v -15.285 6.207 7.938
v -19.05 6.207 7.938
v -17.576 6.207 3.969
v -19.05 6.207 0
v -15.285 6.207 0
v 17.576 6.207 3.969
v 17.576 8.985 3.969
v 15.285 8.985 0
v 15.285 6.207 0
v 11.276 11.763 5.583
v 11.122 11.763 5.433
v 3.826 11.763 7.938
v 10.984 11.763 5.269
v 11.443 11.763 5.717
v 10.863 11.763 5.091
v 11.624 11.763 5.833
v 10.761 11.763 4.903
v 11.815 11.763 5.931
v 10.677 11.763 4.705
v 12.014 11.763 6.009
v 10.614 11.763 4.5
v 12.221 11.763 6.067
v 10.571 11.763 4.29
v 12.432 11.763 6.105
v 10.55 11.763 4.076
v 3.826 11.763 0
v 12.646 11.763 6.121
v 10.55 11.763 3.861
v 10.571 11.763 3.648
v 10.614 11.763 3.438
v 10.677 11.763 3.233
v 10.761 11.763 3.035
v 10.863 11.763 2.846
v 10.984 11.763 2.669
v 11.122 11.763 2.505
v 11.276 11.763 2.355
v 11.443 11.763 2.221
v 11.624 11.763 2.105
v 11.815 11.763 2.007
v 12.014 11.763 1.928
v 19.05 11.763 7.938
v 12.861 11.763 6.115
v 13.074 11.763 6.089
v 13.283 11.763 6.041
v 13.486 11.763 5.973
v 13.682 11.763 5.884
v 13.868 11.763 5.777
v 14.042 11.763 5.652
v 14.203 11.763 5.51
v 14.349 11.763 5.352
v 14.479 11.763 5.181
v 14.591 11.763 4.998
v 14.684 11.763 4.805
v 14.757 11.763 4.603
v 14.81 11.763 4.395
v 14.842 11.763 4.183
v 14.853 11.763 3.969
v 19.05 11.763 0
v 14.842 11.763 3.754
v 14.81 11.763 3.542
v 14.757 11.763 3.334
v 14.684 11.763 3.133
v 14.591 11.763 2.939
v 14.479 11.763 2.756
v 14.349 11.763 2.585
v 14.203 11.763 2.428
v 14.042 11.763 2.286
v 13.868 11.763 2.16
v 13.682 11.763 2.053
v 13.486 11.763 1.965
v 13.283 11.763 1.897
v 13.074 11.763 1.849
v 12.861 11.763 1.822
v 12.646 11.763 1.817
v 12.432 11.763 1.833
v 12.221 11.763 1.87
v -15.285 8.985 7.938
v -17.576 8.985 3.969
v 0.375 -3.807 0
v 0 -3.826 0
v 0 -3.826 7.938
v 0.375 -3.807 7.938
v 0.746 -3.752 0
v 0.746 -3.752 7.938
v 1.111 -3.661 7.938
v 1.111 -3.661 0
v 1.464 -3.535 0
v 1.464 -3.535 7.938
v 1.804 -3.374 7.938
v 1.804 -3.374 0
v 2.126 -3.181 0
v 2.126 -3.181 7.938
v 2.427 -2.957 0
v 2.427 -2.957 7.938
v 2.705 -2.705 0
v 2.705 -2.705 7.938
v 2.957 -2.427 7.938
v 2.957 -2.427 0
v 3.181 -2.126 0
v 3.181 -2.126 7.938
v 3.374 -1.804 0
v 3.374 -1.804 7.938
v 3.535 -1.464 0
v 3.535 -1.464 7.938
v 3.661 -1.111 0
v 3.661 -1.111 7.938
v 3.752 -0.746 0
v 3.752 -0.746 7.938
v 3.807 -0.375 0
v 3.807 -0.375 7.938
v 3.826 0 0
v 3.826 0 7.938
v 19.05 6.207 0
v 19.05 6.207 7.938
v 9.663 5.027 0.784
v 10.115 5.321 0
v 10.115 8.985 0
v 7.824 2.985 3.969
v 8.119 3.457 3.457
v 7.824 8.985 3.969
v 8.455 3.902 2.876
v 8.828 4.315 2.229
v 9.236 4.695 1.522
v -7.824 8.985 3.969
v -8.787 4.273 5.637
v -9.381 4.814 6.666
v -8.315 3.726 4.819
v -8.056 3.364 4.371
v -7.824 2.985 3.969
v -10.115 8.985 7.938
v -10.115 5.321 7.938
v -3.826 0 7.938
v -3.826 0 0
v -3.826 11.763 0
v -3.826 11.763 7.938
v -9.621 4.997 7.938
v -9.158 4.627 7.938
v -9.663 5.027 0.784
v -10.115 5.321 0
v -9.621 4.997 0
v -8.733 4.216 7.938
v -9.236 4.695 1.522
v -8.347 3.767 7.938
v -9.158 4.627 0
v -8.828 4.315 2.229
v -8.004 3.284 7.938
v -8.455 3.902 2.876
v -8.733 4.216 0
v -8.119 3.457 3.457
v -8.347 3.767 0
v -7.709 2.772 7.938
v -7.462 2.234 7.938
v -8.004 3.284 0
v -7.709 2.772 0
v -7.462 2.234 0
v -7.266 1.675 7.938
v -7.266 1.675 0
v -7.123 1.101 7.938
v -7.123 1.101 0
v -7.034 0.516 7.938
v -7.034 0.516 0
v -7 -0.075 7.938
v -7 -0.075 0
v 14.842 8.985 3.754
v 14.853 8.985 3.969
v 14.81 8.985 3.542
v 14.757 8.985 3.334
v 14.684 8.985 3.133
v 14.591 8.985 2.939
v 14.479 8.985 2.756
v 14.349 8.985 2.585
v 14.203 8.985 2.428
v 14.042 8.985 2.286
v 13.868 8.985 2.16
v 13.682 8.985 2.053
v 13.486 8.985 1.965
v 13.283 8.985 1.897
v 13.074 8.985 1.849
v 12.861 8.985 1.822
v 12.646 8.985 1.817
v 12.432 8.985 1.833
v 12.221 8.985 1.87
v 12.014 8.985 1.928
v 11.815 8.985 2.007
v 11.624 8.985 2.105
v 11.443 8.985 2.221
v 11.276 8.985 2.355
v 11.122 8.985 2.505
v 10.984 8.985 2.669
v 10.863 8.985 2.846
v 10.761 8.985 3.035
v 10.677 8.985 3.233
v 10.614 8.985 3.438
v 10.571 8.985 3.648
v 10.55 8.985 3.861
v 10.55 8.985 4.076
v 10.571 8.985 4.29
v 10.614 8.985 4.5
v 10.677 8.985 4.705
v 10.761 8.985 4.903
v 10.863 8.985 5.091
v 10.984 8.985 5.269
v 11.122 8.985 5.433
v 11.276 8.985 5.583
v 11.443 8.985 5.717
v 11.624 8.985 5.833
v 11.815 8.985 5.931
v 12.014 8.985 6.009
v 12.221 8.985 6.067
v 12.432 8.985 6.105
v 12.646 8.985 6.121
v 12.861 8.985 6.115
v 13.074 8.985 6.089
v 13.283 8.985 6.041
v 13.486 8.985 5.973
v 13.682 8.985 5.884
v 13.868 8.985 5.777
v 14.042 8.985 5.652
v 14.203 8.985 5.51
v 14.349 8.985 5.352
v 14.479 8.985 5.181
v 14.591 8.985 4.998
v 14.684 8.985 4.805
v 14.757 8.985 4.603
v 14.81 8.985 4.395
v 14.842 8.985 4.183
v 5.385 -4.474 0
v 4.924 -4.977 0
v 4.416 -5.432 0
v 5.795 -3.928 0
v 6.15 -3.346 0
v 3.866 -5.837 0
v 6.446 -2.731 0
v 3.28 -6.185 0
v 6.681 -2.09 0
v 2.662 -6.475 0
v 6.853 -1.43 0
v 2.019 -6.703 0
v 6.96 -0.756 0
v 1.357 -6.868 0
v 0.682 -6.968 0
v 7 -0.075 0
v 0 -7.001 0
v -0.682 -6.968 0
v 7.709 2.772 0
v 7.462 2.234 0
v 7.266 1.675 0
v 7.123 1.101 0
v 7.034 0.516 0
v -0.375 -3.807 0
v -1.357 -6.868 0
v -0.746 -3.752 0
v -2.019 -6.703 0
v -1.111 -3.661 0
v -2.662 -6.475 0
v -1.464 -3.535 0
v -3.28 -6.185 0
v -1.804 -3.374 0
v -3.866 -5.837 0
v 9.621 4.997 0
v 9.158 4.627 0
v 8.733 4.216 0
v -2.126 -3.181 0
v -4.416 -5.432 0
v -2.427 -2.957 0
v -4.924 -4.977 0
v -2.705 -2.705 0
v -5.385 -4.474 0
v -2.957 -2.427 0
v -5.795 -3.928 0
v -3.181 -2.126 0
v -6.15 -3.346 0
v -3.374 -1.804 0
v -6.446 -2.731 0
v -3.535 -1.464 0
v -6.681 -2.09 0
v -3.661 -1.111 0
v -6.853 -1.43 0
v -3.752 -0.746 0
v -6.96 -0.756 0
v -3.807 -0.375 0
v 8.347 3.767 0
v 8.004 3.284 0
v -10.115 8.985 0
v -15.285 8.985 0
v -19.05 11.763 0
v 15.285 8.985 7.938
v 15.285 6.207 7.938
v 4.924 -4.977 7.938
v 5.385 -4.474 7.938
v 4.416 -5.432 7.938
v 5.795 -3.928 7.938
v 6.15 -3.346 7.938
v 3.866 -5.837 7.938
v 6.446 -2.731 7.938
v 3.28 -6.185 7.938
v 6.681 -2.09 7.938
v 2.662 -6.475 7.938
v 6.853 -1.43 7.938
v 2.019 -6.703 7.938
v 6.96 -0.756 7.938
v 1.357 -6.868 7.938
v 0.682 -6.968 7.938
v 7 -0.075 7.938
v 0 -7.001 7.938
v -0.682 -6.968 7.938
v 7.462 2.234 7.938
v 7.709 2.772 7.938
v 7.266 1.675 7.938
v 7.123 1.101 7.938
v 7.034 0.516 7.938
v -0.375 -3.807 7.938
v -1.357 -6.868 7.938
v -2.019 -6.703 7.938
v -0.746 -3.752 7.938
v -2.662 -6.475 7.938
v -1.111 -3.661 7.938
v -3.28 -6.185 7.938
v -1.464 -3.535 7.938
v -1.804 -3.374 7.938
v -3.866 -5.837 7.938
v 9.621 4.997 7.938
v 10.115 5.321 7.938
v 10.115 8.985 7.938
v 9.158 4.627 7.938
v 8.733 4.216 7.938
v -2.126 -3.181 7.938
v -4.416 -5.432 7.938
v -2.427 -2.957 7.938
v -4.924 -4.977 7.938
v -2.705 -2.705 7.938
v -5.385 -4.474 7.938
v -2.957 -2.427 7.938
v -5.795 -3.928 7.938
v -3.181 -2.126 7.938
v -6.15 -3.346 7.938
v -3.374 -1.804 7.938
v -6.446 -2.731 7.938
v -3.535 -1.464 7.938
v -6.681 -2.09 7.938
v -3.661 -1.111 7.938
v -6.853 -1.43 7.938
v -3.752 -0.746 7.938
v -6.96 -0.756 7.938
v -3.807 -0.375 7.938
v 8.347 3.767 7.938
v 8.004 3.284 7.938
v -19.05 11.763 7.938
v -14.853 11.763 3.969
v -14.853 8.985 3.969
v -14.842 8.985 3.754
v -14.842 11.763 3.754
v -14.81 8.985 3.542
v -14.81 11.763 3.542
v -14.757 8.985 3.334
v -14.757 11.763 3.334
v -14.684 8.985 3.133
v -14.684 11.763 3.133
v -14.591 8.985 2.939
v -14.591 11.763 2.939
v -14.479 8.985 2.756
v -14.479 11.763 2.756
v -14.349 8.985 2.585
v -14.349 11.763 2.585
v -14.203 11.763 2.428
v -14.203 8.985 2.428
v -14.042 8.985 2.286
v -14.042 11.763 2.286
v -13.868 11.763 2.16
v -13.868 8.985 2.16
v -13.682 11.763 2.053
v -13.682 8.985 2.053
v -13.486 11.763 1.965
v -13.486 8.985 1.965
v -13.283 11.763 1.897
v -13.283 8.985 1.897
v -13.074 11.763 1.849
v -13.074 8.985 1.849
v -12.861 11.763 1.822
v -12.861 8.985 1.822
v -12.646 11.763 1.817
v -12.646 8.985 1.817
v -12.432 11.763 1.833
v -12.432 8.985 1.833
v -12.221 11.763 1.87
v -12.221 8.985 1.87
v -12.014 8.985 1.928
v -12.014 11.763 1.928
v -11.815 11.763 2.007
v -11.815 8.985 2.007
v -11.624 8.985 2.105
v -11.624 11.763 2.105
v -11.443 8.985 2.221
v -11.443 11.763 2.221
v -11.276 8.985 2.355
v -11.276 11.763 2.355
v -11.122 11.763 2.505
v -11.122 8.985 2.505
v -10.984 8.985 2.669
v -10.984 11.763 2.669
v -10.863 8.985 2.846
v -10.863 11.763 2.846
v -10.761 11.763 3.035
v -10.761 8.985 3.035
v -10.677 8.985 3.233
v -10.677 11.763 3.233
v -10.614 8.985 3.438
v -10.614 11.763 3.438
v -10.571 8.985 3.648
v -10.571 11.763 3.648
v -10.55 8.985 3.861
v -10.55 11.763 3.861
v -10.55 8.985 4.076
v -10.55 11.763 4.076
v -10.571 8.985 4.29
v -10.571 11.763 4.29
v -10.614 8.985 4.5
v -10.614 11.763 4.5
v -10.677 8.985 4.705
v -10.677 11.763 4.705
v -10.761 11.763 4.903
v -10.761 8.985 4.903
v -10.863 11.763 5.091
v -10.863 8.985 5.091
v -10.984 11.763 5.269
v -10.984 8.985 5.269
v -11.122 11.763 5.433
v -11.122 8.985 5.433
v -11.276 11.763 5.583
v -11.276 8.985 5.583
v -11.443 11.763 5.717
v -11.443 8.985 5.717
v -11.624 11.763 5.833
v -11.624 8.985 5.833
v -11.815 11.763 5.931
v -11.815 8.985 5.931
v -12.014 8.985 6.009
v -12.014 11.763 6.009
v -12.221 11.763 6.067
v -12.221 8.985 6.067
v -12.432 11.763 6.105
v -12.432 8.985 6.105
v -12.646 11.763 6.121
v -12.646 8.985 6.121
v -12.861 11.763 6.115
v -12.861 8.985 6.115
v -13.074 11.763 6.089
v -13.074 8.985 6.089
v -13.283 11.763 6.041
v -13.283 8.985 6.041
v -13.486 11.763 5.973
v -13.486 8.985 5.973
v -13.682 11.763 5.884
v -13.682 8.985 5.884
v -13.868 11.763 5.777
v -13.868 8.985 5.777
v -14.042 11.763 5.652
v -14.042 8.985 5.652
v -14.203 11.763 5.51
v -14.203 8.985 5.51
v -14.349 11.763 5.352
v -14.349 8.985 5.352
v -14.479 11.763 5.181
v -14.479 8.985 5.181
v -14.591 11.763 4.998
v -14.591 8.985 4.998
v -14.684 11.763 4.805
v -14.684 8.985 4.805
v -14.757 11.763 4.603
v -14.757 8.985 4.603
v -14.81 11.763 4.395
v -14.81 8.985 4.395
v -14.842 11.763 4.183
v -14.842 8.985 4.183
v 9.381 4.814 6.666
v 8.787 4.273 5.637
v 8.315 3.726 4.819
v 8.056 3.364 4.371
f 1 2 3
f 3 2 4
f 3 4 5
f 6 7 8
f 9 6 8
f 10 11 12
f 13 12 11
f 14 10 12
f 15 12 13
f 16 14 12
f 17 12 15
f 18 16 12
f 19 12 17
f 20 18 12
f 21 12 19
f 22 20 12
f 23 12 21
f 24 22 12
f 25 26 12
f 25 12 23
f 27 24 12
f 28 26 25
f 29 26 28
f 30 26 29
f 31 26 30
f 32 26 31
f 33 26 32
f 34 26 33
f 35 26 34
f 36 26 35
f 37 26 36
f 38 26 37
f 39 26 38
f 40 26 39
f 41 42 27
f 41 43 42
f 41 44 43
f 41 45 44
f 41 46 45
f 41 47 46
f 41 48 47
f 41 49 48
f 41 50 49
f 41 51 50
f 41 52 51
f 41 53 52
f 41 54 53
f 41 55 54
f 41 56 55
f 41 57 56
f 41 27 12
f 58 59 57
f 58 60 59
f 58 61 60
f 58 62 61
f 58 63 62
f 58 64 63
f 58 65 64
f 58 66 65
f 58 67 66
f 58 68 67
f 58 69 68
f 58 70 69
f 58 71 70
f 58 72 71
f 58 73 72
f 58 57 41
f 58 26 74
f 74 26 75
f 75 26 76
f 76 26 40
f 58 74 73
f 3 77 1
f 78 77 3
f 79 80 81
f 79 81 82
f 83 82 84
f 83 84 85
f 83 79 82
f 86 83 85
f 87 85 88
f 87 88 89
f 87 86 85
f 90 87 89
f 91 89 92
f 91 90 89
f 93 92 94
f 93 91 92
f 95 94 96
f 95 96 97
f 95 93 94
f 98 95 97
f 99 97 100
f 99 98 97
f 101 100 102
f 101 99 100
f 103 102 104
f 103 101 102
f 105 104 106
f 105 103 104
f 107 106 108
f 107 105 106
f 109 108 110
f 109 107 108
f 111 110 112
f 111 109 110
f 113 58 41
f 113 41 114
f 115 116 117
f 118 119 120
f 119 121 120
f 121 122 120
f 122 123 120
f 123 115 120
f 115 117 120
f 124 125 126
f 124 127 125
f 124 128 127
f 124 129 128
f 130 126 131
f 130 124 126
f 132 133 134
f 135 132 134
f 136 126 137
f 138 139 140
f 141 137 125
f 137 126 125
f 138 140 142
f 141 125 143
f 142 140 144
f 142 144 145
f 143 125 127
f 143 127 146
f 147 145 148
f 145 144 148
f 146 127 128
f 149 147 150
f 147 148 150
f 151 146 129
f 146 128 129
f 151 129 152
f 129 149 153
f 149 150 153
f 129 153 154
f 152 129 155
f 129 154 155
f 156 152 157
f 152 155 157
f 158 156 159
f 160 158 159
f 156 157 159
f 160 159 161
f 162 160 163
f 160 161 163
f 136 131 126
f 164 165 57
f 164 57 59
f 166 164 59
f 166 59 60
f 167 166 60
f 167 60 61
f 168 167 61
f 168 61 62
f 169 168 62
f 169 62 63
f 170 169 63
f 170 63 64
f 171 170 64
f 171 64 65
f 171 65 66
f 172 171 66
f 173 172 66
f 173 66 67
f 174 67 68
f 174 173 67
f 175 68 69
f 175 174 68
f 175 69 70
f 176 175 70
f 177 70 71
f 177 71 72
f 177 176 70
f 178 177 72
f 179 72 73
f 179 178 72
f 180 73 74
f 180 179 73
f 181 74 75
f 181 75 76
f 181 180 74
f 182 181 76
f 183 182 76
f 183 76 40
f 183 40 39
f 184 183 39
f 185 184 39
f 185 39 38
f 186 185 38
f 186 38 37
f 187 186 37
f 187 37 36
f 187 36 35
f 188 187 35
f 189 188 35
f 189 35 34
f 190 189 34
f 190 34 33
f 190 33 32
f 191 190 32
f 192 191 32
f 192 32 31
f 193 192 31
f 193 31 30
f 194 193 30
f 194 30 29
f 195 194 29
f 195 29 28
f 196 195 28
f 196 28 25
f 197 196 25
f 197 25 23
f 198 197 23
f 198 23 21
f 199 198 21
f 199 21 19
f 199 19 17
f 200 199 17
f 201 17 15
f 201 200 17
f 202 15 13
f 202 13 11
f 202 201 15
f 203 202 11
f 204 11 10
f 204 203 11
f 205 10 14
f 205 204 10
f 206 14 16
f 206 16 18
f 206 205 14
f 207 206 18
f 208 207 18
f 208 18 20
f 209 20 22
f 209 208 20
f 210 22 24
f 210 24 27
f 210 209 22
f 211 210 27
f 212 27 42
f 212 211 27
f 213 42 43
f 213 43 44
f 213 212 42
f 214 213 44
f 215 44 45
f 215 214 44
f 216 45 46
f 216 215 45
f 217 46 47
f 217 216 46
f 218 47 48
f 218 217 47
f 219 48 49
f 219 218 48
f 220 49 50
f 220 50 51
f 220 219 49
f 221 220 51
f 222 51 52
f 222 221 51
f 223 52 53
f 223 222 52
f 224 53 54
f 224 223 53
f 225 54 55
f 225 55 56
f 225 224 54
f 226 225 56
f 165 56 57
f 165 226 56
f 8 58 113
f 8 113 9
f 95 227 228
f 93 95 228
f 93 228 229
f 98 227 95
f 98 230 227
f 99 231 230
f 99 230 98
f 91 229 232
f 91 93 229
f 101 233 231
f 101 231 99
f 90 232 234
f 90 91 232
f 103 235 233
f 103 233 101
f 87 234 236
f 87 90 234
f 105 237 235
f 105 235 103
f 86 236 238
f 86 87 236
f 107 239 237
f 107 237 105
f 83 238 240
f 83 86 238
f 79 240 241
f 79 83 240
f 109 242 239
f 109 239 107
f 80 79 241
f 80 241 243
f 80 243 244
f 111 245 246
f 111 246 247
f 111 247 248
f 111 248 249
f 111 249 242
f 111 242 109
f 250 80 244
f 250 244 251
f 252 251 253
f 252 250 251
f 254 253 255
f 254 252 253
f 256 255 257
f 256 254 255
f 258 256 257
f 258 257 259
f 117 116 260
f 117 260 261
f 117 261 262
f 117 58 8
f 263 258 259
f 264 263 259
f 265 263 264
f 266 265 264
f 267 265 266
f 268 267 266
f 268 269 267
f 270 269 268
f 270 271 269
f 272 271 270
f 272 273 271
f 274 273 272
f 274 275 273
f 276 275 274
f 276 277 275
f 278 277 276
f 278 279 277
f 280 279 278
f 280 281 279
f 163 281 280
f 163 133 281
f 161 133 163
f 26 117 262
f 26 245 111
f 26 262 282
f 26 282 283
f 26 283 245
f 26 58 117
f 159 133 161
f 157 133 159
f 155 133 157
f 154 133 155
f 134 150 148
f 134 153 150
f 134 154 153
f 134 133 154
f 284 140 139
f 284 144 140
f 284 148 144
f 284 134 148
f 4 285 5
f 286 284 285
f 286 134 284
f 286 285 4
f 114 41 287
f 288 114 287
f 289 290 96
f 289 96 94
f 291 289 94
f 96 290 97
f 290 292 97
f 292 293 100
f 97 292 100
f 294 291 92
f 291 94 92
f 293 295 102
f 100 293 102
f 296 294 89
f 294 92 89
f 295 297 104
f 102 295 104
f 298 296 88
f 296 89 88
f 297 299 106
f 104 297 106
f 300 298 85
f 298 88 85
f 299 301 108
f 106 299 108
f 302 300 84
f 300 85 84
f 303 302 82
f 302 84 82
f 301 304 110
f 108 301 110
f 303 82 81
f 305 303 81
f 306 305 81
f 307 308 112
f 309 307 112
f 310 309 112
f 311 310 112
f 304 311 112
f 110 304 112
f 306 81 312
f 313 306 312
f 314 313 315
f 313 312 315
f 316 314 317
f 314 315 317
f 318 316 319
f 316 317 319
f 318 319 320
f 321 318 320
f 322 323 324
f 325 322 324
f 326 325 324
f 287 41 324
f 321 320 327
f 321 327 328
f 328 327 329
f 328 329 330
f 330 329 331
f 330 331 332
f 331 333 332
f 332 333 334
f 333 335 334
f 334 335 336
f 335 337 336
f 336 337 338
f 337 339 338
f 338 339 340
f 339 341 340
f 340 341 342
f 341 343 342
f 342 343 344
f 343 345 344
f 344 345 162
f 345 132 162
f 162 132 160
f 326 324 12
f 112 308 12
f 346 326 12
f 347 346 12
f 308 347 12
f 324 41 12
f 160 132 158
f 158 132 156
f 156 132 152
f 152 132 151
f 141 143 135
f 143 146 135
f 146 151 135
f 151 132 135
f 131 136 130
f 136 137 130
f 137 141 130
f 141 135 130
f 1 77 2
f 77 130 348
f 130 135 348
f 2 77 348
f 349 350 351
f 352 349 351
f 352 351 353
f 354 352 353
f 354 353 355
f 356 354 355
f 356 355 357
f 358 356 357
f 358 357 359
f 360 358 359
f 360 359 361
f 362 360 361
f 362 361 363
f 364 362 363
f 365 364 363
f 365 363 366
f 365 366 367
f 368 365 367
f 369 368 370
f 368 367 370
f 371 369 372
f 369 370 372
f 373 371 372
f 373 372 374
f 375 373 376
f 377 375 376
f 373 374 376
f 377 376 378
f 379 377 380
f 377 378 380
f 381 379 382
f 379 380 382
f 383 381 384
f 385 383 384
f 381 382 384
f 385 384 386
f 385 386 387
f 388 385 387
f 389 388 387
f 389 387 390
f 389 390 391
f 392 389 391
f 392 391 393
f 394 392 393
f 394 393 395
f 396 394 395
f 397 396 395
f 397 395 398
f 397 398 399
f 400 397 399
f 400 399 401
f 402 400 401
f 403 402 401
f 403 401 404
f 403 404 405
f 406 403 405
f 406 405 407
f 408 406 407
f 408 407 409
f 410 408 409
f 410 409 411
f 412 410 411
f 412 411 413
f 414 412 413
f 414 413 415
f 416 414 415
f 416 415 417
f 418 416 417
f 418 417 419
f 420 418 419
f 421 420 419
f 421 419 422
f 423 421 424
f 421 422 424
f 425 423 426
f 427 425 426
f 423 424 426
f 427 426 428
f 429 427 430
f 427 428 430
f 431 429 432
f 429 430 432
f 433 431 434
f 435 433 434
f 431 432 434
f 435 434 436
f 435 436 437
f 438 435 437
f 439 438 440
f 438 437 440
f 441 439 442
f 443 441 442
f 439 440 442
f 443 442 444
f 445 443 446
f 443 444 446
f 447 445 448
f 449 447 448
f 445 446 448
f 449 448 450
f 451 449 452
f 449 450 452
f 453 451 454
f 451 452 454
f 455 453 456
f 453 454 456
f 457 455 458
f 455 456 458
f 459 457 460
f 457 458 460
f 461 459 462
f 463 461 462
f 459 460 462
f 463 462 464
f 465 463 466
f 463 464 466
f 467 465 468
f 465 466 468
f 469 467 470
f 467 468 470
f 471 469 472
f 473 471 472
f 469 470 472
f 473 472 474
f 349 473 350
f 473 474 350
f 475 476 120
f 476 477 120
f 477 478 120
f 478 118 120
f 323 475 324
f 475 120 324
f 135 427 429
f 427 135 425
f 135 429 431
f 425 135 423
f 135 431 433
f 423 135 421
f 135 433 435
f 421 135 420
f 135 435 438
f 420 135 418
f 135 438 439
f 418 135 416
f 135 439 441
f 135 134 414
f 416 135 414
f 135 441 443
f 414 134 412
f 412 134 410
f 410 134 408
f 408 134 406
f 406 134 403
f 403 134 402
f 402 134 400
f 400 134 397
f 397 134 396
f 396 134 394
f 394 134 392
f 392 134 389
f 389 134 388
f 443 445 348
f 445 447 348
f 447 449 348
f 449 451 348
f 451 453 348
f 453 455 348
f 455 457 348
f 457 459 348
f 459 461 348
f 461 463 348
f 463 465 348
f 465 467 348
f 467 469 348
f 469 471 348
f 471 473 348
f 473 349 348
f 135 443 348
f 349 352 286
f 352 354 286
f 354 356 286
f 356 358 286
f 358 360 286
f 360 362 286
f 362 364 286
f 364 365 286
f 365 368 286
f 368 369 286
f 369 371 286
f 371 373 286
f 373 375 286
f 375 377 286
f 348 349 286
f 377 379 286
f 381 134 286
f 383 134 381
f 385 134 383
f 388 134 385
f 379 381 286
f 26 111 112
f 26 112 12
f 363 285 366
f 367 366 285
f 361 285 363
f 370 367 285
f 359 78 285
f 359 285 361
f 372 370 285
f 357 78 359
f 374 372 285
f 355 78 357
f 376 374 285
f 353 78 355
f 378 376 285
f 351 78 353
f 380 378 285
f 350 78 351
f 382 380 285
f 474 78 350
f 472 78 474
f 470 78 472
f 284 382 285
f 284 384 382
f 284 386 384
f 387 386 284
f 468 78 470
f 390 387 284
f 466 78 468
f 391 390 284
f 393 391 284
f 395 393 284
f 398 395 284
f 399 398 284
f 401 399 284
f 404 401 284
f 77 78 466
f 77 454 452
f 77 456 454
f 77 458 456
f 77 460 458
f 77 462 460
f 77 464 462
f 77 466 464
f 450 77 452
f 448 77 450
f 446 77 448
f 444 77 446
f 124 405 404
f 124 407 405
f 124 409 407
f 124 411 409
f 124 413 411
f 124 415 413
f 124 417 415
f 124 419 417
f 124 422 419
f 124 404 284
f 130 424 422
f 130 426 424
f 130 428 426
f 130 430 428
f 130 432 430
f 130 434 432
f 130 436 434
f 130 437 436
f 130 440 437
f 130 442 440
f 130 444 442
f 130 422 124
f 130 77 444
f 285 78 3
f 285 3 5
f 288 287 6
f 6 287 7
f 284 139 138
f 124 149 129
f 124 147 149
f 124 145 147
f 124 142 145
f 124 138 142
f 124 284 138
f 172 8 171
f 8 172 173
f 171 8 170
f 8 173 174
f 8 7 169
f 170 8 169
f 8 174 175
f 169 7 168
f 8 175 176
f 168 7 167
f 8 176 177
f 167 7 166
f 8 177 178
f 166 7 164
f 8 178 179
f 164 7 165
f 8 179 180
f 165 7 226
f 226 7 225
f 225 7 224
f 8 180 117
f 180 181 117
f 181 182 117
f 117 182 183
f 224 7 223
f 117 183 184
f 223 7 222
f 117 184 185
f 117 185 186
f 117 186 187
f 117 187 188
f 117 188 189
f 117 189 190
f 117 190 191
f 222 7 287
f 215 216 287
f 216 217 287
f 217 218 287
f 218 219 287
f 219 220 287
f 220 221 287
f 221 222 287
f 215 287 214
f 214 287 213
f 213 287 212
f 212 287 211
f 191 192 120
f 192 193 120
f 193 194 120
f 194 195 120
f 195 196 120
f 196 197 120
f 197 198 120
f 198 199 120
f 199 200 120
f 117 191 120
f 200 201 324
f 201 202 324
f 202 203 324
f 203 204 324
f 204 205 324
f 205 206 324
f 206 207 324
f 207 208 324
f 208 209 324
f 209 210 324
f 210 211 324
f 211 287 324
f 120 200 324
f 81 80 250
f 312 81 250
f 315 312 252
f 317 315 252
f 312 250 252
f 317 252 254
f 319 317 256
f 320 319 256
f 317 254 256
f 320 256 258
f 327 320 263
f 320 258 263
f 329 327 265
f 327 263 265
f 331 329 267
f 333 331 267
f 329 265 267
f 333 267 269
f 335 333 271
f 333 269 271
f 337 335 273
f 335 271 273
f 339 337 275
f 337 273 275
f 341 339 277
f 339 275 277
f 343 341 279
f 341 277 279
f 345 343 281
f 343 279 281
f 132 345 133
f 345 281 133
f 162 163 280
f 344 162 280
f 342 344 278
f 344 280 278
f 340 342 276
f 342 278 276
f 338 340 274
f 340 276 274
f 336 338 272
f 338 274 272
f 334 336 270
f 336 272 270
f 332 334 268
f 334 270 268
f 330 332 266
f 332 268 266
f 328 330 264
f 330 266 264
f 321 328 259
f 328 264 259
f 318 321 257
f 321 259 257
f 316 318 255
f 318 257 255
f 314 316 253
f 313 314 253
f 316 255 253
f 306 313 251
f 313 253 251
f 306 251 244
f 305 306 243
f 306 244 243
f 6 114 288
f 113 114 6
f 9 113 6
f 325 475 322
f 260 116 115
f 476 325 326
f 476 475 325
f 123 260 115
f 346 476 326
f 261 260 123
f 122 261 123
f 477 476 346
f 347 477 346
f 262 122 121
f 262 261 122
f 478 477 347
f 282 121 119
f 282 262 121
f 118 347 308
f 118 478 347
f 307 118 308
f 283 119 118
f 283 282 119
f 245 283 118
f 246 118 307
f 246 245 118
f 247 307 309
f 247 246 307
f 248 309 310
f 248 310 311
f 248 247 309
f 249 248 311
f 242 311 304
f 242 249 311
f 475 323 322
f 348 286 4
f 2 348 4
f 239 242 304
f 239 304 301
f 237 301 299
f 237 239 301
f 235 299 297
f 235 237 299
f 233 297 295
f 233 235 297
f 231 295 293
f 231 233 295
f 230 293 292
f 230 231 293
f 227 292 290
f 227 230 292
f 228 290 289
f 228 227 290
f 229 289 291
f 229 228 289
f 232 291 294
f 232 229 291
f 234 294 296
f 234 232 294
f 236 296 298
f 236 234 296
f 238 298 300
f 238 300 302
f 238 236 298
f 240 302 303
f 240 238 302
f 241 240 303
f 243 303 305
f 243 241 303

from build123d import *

# Parameters (mm, degrees)
BOSS_EXTRUDE1_DEPTH     = 7.9375
F_6_CLEARANCE_HOLE1_D   = 4.3053
CUT_EXTRUDE1_DEPTH      = 25.502197286
CUT_EXTRUDE1_DEPTH_BACK = 2.778125


with BuildPart() as part:
    # Sketch1 → Boss-Extrude1 (new body)
    with BuildSketch(Plane.XY):
        with BuildLine():
            Line((-19.05, 11.763375), (-19.05, 6.207125))
            Line((-19.05, 6.207125), (-13.350110486, 6.207125))
            ThreePointArc((-13.350110486, 6.207125), (-8.884072706, 4.37121478), (-7.000474108, -0.074920184))
            ThreePointArc((-7.000474108, -0.074920184), (-4.923806653, -4.976783982), (0, -7.000875))
            Line((0, -7.000875), (0, -3.825875))
            ThreePointArc((0, -3.825875), (-2.705302156, -2.705302156), (-3.825875, 0))
            Line((-3.825875, 0), (-3.825875, 11.763375))
            Line((-3.825875, 11.763375), (-19.05, 11.763375))
        make_face()
    extrude(amount=BOSS_EXTRUDE1_DEPTH)

    # #6 Clearance Hole1 (through all)
    with Locations(Plane(origin=(0, 11.763375, 0), x_dir=(1, 0, 0), z_dir=(0, 1, 0))):
        with Locations((-12.7, -3.96875)):
            Hole(F_6_CLEARANCE_HOLE1_D / 2)

    # Sketch4 → Cut-Extrude1 (cut, two sides: drawn at the far end of the back side and taken through both)
    with BuildSketch(Plane.XZ.offset(-6.207125).offset(-CUT_EXTRUDE1_DEPTH_BACK)):
        Polygon((-17.576011698, 3.96875), (-15.138005849, -0.254), (-10.261994151, -0.254), (-7.823988302, 3.96875), (-10.261994151, 8.1915), (-15.138005849, 8.1915), align=None)
    extrude(amount=CUT_EXTRUDE1_DEPTH + CUT_EXTRUDE1_DEPTH_BACK, mode=Mode.SUBTRACT)

    # Mirror1: part across plane


with BuildPart() as part_1:
    add(part.part)
    add(part.part.mirror(Plane(origin=(0, -3.825875, 7.9375), x_dir=(0, 0, 1), z_dir=(-1, 0, 0))))


solid = part_1.part
